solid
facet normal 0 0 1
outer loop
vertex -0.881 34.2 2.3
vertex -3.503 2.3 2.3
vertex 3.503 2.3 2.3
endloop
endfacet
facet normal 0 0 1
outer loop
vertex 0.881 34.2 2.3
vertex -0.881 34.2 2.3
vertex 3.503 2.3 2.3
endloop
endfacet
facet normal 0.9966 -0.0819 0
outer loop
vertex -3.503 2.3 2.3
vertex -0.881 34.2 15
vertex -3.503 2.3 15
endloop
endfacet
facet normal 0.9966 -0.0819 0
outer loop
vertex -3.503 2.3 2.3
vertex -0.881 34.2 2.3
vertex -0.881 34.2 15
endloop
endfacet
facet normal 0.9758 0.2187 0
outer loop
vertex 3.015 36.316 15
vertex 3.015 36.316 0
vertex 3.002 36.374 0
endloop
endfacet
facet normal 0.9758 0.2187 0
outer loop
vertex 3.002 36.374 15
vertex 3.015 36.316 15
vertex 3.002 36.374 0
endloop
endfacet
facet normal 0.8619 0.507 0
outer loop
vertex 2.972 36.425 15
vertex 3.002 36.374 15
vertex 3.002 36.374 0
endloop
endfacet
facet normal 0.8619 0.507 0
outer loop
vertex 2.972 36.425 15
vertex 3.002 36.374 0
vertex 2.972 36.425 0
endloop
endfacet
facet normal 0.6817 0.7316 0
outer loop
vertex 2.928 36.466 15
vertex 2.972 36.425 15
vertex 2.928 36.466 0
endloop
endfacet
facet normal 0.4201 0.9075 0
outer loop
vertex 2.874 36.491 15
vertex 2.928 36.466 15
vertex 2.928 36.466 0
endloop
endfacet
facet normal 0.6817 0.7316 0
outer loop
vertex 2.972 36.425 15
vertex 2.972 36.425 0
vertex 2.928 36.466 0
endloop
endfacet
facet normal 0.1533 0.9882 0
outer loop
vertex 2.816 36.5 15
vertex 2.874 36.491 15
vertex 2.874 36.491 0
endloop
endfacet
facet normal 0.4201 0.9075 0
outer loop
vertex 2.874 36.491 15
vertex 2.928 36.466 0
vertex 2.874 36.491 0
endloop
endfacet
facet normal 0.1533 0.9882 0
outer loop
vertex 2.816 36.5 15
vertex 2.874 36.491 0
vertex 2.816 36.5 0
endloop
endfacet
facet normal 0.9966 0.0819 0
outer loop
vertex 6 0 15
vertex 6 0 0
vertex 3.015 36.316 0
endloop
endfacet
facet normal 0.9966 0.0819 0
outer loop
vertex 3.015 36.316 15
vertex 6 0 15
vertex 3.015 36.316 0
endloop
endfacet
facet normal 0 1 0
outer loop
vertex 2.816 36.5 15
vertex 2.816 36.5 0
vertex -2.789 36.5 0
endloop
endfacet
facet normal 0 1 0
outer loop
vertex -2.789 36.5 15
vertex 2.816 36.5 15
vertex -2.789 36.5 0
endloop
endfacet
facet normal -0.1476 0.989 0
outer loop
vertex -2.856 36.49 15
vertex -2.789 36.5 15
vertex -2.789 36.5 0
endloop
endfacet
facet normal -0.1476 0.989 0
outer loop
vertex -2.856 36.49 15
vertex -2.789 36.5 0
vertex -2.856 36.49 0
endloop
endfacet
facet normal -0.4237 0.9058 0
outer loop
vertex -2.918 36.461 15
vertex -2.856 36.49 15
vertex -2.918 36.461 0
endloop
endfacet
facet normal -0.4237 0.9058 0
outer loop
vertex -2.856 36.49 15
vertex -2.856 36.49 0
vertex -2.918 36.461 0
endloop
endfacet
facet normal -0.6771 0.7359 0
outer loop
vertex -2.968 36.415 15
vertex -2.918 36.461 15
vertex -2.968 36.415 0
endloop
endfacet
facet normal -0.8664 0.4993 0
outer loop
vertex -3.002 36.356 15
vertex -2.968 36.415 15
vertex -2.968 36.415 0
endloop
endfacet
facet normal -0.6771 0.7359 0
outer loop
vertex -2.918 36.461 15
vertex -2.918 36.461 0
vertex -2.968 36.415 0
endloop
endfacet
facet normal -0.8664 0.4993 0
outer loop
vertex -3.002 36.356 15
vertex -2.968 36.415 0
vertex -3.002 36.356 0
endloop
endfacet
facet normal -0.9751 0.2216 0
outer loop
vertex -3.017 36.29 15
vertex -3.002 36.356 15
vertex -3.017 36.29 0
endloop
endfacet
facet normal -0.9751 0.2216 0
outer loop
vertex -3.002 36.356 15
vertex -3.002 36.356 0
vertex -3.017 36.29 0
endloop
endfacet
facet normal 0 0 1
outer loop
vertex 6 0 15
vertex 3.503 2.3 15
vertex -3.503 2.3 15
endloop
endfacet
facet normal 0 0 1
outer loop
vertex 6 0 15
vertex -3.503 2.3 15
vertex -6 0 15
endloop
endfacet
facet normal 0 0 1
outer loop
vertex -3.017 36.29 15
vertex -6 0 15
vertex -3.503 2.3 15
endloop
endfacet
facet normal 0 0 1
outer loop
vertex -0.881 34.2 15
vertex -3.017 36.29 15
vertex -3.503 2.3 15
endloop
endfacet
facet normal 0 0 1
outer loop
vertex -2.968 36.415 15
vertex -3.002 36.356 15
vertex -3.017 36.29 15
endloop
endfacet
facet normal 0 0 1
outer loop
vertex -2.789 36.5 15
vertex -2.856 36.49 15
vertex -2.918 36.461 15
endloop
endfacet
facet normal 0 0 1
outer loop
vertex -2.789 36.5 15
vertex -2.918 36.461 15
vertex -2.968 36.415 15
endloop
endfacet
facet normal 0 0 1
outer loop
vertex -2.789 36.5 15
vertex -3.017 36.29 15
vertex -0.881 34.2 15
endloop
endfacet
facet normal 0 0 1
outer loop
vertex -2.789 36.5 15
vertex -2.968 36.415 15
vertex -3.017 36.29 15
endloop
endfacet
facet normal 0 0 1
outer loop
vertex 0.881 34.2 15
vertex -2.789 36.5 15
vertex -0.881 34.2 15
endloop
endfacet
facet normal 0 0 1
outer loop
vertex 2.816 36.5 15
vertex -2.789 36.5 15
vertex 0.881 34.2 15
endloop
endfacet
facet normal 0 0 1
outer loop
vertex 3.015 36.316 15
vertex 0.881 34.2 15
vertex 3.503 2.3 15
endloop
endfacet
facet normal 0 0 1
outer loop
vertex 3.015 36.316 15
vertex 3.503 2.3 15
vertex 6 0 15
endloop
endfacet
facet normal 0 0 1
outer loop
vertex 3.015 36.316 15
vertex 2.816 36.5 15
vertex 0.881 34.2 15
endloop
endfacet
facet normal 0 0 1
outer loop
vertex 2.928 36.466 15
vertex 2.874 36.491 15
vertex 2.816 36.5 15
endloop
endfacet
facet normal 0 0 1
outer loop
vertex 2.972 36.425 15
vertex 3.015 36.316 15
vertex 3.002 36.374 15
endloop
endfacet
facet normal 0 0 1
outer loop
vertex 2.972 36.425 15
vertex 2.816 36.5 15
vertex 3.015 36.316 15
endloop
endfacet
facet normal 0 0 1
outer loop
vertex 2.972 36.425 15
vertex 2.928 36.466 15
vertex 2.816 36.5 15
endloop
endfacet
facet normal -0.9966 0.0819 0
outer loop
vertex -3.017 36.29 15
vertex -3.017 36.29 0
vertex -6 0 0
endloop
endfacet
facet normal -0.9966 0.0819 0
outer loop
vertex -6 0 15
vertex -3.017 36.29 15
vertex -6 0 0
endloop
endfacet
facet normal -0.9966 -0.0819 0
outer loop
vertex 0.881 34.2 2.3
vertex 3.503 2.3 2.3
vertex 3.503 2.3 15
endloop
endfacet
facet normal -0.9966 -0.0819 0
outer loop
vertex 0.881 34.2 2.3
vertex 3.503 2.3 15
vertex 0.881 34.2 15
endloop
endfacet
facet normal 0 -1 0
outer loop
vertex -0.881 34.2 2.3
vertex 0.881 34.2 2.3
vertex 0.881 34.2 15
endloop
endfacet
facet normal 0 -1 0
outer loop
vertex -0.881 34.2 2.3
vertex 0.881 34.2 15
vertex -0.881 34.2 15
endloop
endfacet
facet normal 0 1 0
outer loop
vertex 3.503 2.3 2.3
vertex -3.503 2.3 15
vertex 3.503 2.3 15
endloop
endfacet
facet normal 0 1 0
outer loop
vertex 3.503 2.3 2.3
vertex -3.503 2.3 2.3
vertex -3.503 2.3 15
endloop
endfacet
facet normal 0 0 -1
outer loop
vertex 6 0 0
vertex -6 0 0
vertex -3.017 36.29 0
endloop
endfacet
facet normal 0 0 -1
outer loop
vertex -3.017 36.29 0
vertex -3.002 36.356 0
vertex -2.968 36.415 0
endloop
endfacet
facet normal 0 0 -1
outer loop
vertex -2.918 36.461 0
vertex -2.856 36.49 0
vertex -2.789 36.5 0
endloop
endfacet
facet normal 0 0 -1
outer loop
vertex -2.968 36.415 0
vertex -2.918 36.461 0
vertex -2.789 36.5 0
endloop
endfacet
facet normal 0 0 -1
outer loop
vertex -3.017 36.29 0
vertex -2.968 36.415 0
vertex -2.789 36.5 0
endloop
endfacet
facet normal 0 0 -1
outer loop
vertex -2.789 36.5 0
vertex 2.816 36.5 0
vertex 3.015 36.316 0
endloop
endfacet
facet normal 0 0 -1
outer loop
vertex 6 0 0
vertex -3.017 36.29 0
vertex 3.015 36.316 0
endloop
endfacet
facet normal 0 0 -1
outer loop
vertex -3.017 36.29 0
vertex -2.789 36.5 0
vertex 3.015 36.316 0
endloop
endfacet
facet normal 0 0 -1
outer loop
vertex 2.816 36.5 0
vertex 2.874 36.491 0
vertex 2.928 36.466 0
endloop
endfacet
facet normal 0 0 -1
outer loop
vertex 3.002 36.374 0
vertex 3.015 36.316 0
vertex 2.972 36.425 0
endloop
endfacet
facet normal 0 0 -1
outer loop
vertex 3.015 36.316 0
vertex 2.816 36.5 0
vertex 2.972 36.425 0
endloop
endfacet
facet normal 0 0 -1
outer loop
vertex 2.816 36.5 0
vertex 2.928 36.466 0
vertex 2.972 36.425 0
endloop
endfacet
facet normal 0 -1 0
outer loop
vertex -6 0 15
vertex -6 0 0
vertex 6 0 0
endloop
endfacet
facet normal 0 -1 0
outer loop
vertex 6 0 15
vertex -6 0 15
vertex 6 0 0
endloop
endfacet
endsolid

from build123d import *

# Parameters (mm, degrees)
F1_DEPTH = 15
F2_T     = -2.3


with BuildPart() as f1:
    # F0 (on Top) → F1 (new body)
    with BuildSketch(Plane.XY):
        with BuildLine():
            Line((2.815764, 36.5), (0, 36.5))
            Line((0, 36.5), (-2.789257, 36.5))
            ThreePointArc((-2.789257, 36.5), (-2.944258, 36.439489), (-3.017263, 36.289965))
            Line((-3.017263, 36.289965), (-6, 0))
            Line((-6, 0), (0, 0))
            Line((0, 0), (6, 0))
            Line((6, 0), (3.015092, 36.316383))
            ThreePointArc((3.015092, 36.316383), (2.951269, 36.4471), (2.815764, 36.5))
        make_face()
    extrude(amount=F1_DEPTH)

    # F2
    f2_openings = [f1.faces().sort_by_distance(p)[0] for p in [
        (2e-05, 16.221217, 15),
    ]]
    offset(amount=F2_T, openings=f2_openings)


solid = f1.part
